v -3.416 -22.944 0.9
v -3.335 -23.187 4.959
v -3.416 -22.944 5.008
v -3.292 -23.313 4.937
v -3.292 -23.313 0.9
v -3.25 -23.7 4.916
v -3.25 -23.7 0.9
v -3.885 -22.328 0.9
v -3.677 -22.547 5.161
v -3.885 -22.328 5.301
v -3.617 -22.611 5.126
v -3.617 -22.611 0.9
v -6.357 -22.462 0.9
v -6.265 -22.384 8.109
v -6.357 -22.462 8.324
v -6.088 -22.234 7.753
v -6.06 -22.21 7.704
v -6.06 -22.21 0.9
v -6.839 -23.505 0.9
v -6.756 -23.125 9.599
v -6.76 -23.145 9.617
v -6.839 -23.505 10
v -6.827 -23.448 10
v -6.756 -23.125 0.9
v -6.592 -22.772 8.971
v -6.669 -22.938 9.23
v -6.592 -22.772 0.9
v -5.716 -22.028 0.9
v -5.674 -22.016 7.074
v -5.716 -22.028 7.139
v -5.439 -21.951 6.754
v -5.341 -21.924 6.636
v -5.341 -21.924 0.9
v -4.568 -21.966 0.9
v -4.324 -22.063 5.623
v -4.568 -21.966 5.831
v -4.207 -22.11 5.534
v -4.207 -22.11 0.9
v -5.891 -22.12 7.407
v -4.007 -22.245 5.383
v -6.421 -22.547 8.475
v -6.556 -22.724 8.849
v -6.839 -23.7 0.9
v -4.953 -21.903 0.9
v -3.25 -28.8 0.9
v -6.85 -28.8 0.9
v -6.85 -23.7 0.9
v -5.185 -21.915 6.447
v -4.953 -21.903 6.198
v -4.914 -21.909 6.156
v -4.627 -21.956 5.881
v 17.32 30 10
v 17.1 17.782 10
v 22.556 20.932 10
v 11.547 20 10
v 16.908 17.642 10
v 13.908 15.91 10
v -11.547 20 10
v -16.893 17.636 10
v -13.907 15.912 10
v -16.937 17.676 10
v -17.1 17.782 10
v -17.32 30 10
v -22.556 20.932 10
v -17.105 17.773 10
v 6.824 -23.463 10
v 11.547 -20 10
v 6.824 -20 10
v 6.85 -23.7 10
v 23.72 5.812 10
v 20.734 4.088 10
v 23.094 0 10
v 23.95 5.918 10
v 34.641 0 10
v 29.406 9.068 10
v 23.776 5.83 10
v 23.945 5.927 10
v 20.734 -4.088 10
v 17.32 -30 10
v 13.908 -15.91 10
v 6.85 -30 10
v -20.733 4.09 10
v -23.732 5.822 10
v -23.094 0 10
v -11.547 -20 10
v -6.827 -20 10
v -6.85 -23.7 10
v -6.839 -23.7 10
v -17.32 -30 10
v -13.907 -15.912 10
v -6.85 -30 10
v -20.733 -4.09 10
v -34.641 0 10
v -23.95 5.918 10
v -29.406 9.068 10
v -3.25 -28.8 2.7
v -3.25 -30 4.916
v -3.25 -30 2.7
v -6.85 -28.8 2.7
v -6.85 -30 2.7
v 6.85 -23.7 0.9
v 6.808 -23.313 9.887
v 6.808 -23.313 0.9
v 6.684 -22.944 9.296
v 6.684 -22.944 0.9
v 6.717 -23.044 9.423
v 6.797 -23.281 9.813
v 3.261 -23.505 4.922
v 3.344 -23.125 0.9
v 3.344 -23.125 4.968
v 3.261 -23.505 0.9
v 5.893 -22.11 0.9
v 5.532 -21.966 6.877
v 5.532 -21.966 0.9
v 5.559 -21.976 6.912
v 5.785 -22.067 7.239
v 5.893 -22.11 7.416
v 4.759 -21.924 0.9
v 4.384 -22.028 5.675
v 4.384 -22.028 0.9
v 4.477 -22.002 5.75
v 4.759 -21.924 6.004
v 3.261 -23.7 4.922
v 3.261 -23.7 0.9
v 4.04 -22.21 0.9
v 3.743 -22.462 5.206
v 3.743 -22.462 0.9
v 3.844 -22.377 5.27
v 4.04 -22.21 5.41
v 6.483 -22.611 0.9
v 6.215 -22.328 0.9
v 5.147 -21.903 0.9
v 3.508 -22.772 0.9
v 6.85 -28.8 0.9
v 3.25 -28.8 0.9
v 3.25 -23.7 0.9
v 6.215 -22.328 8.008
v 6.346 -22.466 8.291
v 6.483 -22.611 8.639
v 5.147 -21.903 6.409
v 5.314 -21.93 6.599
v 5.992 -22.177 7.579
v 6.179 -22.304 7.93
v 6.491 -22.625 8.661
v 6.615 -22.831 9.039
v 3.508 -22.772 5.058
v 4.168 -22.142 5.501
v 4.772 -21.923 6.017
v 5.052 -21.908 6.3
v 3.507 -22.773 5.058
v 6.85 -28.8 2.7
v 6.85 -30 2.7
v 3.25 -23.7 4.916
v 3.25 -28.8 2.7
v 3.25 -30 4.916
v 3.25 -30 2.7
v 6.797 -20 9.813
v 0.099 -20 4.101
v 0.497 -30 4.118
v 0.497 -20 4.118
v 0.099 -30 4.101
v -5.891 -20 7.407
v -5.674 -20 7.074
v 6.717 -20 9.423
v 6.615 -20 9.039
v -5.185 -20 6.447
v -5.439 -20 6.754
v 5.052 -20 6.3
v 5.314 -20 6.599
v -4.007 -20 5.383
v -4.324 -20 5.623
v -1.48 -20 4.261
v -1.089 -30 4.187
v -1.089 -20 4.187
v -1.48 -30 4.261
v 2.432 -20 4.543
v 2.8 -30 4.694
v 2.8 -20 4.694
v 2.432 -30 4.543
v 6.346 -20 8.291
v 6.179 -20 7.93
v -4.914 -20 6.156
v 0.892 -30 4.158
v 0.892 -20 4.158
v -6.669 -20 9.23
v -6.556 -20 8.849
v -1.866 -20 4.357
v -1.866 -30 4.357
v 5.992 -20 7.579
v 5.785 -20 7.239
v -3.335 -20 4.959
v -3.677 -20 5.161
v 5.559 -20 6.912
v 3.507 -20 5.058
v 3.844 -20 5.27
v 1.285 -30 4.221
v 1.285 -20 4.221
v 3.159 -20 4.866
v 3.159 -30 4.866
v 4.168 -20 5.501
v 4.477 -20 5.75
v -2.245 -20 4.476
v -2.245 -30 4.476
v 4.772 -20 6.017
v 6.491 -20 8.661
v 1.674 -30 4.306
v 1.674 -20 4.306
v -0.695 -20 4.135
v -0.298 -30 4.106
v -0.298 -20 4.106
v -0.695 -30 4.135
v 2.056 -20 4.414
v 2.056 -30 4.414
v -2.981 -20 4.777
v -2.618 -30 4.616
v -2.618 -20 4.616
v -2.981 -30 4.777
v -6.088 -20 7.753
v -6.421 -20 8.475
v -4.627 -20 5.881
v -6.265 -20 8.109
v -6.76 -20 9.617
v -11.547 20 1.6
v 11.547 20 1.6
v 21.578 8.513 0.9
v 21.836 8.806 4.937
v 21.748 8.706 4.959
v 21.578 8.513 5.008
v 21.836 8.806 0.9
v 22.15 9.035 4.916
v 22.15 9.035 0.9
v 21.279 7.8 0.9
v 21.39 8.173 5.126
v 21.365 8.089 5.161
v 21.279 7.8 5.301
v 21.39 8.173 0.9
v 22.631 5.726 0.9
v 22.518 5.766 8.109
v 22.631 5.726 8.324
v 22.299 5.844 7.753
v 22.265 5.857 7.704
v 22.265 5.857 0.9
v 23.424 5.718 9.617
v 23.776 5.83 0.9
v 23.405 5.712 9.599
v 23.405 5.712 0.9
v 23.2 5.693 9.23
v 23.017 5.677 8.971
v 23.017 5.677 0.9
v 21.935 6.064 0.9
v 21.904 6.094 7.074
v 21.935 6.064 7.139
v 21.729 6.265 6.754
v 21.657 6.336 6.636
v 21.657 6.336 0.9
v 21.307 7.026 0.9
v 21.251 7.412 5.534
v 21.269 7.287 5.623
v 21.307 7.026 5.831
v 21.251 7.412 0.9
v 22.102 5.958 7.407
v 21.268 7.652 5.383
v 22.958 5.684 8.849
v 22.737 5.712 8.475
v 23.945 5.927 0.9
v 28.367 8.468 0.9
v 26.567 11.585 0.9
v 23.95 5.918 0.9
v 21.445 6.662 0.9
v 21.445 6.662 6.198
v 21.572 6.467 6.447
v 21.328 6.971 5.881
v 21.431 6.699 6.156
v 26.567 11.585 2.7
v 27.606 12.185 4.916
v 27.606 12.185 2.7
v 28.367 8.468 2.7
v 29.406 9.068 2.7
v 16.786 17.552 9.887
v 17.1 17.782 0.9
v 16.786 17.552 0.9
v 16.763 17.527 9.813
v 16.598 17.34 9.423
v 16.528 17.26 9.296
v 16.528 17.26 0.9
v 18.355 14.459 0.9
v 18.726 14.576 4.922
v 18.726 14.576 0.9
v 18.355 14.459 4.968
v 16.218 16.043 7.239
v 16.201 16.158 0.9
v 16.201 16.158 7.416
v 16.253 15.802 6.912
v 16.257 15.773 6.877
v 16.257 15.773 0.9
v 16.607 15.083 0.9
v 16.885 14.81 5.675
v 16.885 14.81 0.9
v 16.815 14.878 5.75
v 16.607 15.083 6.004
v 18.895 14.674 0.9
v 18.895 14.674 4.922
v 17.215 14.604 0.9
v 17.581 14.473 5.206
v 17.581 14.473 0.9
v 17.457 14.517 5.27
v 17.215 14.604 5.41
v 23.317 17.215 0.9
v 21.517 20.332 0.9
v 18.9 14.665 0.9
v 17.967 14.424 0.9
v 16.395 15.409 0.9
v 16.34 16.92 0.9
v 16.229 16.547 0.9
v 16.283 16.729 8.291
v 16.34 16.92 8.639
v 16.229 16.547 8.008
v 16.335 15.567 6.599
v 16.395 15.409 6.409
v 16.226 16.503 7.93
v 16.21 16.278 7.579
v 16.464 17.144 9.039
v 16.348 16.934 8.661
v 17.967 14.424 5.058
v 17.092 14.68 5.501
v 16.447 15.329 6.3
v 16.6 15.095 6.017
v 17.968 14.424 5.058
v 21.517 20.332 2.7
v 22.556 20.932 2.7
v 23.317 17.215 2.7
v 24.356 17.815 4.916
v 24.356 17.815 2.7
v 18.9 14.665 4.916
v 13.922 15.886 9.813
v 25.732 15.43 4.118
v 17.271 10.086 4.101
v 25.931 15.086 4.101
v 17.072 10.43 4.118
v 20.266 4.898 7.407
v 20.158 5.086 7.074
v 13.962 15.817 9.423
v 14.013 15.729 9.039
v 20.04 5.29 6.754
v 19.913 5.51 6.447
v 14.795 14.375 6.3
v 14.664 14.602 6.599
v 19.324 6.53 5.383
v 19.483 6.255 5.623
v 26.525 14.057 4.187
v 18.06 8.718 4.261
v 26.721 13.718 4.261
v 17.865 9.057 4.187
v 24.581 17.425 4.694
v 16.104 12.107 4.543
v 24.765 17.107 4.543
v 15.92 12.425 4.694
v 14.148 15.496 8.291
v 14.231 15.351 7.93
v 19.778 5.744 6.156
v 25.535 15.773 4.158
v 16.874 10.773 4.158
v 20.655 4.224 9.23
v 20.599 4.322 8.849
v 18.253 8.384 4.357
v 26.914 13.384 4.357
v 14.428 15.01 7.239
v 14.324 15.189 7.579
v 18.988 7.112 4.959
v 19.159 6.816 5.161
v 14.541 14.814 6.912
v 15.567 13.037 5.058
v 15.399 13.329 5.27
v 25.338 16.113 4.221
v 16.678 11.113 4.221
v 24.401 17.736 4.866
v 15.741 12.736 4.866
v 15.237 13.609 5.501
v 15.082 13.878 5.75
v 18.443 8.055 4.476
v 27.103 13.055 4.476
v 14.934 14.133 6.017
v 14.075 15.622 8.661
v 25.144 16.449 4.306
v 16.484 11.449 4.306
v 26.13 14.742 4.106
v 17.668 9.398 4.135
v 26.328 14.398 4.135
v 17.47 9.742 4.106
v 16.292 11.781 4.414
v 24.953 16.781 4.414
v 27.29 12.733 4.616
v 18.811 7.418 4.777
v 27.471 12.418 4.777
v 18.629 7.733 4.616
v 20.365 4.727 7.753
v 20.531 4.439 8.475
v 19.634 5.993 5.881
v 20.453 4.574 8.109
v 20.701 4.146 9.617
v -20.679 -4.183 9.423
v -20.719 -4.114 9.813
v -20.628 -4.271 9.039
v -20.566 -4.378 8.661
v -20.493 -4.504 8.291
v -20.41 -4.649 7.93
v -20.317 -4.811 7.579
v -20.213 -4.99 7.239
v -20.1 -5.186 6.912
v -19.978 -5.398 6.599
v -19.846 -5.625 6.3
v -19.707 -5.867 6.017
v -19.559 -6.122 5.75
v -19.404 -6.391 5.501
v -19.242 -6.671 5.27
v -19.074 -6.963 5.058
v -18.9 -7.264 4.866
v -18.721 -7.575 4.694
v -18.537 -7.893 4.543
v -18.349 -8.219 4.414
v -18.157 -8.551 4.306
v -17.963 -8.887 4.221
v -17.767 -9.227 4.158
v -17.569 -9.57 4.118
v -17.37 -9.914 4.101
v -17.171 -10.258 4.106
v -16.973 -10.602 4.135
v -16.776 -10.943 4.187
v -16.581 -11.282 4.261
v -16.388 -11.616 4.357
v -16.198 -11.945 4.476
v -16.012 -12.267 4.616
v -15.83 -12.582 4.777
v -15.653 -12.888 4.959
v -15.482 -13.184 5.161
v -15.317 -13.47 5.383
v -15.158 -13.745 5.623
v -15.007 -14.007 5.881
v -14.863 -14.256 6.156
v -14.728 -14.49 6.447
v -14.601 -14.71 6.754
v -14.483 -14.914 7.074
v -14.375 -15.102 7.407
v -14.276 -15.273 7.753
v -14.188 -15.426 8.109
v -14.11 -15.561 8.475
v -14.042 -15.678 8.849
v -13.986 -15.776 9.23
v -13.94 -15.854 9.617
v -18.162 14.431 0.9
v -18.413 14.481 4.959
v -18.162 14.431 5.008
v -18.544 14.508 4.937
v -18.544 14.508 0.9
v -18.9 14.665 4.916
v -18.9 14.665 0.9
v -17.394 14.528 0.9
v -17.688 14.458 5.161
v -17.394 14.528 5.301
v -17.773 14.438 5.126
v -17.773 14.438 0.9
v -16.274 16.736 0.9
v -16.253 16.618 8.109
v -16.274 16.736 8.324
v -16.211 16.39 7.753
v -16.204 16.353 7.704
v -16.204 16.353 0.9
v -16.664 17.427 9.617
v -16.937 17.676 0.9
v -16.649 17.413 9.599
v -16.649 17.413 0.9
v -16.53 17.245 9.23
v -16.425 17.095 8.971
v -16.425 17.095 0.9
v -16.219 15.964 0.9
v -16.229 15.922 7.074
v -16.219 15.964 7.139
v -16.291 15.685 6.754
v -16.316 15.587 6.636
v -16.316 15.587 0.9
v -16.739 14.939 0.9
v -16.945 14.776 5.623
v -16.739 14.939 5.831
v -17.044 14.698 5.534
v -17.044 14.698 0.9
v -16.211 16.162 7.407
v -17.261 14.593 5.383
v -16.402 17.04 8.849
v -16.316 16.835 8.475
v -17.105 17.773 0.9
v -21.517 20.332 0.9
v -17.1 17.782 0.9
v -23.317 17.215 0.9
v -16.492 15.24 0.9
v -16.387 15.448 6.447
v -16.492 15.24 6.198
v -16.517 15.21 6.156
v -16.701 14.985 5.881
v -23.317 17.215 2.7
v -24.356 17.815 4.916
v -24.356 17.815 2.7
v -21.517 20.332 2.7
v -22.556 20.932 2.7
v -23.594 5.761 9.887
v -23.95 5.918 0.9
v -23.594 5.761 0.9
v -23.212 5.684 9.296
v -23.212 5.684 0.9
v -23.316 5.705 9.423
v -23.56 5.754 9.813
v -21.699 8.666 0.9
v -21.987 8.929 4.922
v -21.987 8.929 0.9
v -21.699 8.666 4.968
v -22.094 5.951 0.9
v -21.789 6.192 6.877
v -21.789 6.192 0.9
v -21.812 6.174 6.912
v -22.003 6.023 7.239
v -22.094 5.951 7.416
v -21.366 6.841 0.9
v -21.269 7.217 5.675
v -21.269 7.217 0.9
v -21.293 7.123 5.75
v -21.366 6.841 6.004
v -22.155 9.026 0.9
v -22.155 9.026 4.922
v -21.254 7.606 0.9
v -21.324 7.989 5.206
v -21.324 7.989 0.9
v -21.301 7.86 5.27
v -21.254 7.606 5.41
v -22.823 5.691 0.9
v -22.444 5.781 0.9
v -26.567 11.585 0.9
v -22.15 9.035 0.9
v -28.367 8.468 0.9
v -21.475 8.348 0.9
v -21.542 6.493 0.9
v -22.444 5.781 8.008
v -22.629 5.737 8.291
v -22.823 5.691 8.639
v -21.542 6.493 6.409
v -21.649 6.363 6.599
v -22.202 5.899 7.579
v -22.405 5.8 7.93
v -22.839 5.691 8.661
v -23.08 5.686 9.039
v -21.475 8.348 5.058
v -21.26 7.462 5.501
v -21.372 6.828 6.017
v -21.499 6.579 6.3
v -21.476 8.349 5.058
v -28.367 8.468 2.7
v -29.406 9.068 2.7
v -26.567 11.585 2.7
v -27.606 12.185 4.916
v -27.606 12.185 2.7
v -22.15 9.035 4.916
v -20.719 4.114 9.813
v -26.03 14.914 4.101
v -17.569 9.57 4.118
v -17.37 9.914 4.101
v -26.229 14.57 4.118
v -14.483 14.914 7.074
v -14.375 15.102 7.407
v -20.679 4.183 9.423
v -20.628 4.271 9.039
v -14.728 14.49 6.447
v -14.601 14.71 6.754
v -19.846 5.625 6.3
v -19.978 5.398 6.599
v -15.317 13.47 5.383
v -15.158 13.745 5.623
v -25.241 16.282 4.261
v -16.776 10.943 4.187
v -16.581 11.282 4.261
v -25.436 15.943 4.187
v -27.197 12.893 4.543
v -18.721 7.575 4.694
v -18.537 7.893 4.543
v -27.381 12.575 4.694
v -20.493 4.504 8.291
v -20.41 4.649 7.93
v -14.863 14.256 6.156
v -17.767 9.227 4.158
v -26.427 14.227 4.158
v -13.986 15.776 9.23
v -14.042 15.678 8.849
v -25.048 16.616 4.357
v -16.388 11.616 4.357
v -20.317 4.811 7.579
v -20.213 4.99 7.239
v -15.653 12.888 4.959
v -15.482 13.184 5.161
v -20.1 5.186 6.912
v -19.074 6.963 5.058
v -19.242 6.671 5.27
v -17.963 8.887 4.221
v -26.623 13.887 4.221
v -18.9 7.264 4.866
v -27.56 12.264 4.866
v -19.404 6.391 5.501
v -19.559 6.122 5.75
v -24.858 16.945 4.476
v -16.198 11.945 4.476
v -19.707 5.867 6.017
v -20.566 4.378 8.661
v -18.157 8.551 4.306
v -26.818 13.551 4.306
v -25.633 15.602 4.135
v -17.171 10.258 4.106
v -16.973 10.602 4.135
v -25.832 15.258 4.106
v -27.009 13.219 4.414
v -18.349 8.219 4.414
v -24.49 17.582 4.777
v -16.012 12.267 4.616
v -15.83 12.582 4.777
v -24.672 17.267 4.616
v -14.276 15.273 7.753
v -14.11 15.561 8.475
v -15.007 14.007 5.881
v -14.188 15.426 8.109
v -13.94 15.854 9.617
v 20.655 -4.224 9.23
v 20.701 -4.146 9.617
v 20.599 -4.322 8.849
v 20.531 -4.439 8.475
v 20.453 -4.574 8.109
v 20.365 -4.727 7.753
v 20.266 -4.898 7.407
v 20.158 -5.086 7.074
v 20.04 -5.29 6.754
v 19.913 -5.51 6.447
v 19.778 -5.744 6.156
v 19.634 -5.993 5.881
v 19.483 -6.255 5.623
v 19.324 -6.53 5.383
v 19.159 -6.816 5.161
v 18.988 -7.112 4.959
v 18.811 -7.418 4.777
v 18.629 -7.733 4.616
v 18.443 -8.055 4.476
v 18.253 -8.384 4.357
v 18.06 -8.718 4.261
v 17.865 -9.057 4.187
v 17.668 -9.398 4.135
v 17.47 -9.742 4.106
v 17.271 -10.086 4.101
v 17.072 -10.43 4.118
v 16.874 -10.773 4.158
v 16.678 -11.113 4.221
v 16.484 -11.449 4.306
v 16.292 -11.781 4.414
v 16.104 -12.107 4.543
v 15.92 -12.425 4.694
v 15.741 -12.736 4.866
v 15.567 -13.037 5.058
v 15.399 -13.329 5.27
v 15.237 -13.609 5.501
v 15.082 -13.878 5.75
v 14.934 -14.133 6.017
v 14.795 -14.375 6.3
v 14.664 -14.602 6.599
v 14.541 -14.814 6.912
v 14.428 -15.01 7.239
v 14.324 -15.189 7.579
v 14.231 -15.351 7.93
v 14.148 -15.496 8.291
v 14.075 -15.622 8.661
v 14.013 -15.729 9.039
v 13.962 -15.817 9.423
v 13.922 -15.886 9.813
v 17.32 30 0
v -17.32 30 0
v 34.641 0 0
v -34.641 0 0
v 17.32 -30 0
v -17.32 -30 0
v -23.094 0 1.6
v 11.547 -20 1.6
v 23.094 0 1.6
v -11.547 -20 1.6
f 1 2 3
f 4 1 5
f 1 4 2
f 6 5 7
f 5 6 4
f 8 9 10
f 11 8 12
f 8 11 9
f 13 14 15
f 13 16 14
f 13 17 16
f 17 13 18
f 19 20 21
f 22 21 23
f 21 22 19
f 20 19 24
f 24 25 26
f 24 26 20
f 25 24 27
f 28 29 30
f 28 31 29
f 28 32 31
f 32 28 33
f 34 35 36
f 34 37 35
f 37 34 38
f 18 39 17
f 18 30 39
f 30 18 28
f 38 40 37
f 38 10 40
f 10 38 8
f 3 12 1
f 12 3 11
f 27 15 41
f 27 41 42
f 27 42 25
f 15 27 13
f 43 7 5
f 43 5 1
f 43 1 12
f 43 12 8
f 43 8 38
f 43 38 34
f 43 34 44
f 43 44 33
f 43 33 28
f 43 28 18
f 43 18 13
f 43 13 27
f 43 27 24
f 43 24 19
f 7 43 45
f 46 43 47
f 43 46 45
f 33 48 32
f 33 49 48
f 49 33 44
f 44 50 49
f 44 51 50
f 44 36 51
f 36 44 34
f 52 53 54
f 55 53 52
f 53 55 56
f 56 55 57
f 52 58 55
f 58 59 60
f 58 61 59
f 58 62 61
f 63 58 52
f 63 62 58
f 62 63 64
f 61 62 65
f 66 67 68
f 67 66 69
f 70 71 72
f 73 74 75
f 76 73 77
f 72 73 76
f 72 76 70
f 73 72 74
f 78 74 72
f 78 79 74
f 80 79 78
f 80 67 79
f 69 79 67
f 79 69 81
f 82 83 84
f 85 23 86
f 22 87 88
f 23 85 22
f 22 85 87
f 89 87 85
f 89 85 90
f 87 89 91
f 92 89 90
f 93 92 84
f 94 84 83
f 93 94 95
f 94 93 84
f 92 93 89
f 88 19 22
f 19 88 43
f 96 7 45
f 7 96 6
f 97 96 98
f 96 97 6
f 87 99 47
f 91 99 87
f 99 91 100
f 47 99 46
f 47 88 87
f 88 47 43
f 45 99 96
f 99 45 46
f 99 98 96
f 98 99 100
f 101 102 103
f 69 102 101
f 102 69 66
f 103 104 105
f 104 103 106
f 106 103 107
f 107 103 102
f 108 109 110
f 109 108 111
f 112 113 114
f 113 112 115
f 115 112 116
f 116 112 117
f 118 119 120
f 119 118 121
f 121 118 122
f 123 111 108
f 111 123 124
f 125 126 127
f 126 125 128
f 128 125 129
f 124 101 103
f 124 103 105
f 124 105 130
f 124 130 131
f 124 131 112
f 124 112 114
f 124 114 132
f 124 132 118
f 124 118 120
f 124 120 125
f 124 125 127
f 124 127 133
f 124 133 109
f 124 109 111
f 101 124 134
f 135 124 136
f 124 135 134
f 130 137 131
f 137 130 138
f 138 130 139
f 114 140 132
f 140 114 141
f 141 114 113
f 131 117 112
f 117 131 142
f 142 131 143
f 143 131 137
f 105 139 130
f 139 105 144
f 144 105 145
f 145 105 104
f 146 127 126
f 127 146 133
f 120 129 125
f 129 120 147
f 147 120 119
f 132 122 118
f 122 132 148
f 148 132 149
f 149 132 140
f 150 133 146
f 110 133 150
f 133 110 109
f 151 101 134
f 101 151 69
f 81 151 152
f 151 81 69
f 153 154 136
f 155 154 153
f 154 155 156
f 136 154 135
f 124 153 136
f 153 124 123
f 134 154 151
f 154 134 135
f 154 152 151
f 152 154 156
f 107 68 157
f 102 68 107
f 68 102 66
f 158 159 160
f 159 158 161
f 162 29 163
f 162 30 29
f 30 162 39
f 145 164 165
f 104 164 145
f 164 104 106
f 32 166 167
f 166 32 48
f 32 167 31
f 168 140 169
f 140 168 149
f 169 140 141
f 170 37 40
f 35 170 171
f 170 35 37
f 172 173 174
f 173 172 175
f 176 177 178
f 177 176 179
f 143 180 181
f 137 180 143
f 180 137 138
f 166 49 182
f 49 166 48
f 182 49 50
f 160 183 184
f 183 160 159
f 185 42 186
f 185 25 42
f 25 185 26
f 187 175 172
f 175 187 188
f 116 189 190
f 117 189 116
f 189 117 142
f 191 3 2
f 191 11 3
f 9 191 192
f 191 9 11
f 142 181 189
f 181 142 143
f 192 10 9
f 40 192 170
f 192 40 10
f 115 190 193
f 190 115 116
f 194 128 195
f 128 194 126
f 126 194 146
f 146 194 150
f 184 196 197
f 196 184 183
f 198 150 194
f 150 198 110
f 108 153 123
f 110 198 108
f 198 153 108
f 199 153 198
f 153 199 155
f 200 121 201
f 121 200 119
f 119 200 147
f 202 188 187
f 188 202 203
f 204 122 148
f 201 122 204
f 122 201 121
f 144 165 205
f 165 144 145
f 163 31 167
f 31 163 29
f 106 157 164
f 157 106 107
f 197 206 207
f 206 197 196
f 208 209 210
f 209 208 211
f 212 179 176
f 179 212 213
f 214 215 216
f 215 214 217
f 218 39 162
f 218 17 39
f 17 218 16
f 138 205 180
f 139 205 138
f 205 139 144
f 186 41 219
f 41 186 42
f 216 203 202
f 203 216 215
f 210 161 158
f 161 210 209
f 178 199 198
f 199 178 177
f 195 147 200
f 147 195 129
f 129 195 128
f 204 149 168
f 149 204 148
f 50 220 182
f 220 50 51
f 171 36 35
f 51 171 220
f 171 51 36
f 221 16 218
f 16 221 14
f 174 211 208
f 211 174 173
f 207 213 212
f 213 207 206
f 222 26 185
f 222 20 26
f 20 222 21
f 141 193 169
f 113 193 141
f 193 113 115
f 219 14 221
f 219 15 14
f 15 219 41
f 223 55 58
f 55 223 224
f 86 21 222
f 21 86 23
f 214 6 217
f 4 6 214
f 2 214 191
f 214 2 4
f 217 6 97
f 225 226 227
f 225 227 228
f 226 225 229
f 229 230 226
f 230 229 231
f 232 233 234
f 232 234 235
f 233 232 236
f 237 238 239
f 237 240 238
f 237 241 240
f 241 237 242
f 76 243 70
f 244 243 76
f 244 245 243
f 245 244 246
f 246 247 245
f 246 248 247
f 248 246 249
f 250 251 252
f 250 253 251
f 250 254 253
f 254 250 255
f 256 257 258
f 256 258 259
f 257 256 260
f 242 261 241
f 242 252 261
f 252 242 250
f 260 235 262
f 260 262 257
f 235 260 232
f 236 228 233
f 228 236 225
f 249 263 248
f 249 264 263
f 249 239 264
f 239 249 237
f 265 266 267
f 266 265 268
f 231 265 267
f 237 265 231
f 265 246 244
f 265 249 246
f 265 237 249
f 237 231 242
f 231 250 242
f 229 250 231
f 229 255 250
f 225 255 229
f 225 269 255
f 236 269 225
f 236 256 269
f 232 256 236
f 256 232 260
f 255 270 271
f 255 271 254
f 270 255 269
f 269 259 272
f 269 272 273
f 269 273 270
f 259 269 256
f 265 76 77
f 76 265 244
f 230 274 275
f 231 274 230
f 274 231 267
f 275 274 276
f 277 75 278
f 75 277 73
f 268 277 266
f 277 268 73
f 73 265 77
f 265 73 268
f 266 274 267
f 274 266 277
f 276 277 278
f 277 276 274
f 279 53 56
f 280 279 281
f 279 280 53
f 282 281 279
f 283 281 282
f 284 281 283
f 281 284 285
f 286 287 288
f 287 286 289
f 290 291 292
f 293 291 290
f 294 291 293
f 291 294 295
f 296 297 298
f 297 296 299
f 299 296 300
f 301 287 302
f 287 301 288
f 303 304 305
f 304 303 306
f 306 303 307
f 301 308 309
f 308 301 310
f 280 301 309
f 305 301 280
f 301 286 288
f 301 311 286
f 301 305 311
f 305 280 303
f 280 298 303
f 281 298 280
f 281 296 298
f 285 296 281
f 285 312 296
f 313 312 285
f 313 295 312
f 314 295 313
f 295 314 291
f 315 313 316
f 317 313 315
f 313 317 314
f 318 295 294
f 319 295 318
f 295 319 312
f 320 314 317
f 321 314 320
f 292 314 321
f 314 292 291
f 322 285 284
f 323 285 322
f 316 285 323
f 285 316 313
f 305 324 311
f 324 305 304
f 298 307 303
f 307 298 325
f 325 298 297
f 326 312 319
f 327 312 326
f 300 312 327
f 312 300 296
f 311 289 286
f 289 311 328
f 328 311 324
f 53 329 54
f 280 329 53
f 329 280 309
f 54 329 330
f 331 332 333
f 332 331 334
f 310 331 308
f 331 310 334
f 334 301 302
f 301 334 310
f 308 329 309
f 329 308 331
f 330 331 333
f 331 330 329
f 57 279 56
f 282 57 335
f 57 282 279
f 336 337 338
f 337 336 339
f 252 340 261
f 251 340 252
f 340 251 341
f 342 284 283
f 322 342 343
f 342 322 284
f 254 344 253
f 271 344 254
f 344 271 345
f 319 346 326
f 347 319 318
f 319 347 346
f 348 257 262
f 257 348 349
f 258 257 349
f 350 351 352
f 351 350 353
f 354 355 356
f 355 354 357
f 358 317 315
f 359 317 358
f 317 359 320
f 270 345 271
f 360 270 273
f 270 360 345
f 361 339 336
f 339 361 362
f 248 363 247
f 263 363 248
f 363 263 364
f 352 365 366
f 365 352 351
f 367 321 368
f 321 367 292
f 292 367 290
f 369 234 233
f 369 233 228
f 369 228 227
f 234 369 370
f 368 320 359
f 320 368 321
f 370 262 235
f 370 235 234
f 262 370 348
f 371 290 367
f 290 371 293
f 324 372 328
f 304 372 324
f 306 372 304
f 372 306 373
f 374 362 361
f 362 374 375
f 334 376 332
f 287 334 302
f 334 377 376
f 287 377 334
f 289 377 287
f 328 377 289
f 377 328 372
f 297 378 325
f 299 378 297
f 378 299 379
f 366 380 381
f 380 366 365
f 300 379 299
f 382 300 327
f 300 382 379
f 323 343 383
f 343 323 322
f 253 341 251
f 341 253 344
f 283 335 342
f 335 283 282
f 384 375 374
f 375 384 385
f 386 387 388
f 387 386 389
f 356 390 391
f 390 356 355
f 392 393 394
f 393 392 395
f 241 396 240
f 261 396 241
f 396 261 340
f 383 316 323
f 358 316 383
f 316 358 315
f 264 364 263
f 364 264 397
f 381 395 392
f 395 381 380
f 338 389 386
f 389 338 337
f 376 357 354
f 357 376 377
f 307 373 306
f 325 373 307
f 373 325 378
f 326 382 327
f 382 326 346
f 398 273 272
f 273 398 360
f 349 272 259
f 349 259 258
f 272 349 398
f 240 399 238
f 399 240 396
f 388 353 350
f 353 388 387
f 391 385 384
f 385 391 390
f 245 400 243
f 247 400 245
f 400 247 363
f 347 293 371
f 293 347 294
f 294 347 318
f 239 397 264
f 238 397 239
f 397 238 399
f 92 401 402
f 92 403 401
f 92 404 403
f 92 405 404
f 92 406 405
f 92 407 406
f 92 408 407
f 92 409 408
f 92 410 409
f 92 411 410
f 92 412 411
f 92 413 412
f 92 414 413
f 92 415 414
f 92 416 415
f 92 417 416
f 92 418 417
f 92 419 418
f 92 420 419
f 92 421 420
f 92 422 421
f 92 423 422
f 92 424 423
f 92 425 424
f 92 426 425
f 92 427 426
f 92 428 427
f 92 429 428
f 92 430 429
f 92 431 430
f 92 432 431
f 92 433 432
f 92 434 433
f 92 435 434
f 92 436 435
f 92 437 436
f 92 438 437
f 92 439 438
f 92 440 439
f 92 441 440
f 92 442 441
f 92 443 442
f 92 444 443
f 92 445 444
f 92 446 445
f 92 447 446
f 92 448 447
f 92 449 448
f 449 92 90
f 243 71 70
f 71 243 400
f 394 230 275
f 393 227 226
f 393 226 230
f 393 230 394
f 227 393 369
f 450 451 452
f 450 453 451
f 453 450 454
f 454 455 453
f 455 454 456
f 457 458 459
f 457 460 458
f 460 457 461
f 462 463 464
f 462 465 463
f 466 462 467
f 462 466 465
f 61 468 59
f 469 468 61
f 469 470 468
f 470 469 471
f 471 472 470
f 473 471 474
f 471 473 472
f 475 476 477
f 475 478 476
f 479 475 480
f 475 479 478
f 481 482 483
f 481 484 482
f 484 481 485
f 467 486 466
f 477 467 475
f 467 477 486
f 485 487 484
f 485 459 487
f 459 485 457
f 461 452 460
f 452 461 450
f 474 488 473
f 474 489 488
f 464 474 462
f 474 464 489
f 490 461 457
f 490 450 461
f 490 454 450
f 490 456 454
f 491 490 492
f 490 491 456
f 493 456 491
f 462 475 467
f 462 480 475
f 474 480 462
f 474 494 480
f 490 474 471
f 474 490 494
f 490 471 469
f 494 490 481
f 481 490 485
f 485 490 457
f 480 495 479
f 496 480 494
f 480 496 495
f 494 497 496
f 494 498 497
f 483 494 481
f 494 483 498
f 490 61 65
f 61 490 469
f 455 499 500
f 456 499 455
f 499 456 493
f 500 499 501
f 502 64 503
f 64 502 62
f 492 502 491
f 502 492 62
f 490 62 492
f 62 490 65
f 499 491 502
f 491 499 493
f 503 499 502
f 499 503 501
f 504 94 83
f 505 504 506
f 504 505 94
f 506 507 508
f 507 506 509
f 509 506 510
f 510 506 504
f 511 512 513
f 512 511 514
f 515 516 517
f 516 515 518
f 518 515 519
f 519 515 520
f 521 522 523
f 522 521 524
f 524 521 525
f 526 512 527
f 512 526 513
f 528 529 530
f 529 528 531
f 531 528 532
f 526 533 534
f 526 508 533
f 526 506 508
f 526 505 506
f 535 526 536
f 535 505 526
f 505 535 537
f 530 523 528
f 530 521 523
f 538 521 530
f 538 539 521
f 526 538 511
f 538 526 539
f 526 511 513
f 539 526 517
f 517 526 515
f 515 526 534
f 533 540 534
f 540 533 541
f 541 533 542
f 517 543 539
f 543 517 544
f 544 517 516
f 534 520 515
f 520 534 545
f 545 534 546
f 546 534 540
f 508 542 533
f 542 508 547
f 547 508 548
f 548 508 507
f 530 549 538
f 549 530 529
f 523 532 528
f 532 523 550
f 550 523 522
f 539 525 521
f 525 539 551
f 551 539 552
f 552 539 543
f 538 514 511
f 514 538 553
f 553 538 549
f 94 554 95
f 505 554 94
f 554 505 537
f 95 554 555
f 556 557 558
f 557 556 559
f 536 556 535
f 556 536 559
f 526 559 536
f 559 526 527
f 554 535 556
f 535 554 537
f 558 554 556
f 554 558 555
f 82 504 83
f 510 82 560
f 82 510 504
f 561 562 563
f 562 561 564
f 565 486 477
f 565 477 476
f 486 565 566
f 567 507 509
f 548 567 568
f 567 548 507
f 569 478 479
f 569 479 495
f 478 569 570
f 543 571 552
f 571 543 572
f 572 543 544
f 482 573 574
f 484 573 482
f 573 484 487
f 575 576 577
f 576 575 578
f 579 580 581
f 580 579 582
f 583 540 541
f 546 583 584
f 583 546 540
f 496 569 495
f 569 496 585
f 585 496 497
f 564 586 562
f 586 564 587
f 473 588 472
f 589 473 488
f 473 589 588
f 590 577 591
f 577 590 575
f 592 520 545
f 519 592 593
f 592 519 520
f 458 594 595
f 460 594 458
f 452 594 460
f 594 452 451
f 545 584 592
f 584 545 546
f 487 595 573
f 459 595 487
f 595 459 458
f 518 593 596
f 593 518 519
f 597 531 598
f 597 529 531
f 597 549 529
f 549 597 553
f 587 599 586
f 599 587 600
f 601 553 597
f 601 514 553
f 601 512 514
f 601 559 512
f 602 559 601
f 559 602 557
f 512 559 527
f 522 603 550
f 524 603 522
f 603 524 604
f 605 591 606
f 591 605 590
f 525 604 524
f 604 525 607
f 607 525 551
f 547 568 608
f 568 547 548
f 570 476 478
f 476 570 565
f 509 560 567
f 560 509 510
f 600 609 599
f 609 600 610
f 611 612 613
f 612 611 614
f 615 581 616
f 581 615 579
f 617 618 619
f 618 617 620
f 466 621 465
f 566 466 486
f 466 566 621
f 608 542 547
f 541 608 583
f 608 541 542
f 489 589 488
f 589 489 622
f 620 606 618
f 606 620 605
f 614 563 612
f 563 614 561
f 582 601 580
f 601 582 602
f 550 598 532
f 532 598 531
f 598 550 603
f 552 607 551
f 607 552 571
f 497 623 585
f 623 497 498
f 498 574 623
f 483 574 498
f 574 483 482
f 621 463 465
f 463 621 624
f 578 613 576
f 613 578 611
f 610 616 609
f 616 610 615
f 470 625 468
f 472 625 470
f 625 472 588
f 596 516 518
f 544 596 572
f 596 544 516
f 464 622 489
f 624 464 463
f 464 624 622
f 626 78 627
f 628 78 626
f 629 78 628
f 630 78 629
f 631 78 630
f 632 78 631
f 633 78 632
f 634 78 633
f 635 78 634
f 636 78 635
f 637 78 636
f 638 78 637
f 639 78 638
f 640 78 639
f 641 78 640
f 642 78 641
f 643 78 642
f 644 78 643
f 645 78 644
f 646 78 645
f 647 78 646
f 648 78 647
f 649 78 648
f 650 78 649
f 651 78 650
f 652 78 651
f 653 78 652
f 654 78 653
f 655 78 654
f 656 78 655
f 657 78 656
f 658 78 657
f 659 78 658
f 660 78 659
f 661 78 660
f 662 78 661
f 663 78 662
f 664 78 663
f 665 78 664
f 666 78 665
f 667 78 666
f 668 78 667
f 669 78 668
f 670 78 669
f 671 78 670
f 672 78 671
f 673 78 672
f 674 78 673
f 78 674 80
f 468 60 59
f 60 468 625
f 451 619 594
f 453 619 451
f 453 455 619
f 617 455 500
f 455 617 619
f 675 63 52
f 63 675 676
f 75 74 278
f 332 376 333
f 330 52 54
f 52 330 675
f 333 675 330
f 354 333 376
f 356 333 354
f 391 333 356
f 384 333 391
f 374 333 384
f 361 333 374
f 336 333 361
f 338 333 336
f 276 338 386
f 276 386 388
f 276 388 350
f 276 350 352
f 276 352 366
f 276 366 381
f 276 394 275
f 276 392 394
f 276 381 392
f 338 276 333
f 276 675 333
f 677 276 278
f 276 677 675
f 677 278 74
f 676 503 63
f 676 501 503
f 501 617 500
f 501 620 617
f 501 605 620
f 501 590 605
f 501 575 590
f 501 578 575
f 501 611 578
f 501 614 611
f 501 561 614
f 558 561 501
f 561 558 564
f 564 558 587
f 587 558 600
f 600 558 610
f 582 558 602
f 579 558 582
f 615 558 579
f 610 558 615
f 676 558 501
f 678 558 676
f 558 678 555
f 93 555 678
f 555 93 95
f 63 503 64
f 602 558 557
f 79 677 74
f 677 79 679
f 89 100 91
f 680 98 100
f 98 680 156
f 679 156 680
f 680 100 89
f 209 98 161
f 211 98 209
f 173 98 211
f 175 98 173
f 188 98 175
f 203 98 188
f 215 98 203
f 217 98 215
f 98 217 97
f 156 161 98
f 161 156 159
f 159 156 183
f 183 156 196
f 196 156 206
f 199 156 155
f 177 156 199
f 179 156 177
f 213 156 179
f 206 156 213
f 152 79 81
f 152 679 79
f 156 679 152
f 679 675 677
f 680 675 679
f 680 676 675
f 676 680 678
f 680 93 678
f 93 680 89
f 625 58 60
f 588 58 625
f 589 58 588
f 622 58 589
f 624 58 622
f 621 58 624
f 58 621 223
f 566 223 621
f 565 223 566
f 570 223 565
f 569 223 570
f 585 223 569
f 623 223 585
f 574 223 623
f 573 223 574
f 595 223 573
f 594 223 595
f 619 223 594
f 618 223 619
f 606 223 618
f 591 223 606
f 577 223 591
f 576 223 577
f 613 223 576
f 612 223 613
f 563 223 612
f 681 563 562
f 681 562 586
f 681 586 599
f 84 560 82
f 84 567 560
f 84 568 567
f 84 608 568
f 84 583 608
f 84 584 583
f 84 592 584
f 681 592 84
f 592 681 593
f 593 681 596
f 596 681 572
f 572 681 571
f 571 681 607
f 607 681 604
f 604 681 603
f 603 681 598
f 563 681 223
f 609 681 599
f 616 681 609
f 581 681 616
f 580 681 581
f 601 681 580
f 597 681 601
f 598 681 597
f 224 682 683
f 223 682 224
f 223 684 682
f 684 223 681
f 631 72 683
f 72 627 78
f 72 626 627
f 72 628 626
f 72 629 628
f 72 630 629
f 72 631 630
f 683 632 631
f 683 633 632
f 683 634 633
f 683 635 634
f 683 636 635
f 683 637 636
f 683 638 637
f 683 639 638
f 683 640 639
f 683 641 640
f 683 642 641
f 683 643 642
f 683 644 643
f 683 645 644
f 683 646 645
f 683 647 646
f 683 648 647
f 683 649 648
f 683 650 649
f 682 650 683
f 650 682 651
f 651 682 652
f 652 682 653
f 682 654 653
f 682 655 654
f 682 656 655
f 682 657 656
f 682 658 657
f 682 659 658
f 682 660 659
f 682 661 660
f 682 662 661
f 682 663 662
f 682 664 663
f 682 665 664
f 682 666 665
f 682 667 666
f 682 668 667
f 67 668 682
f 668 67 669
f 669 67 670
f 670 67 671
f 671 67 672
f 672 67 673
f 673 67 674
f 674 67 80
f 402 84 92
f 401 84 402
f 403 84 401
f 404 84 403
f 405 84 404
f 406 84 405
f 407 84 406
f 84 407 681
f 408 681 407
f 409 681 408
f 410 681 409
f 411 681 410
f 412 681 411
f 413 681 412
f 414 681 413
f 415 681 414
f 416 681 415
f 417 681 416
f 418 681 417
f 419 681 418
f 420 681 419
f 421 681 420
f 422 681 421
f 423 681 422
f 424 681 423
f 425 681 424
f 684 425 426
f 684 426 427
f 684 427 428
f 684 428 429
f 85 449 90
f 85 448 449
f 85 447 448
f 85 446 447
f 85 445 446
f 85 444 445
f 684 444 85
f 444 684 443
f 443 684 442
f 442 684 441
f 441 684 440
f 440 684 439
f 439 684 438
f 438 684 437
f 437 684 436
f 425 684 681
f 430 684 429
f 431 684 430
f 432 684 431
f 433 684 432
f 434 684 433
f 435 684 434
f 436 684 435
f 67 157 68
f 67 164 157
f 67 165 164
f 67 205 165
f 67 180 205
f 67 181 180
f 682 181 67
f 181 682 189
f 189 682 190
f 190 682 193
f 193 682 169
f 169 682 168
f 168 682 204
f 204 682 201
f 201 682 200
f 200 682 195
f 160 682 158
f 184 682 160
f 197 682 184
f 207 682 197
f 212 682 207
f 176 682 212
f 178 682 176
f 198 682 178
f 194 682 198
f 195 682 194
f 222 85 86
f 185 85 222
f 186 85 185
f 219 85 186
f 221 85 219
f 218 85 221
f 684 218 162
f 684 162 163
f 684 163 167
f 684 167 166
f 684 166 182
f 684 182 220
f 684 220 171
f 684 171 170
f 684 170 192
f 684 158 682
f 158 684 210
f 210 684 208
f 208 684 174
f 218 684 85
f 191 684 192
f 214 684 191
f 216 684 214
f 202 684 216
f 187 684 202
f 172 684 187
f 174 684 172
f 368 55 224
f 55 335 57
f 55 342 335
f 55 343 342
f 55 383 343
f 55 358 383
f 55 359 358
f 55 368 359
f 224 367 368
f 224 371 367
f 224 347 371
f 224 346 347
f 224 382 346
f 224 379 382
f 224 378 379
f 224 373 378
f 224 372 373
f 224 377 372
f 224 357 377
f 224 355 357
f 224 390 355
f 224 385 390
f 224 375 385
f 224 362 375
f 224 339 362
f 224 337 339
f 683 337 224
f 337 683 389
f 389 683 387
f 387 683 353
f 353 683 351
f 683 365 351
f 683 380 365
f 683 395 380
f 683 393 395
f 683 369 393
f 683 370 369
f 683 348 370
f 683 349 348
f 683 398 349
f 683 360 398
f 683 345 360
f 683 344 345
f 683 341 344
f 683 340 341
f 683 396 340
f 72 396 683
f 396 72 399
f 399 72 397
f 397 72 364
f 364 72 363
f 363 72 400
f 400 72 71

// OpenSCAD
// file: hexagon.scad
module hexagon (h = 10, s = 59.7)
{
  r = s / 2 / cos (30);
  linear_extrude (height = h)
    polygon ([for (phi = [0:60:360]) [r*cos(phi), r*sin(phi)]]);
}
// file: rail_stamp.scad
module rail_stamp(rinne_offset = 0.01)
{
// Design so, dass 0,0,0 die Mitte der Rinne,
// Außenkante Sechseck, Oberfläche ist.
// Mit rinne_offset kann der Zylinder für die Rinne
// über das Minimum hinaus verlängert werden

noff = 1;  // auch ein Offset, allerdings wird der nach hinten freigeschnitten (für moderate Neigungen)

// Fix, bzw. durch die Geometrie des Spiels vorgegeben
D_Kugel   = 12.8; // mm
D_Rinne   = 13.8; // mm
h_Rinne   = 5.9;  // Rinnentiefe in mm

// Die zwei Ausbuchtungen recht und links
D_bogen  = 3.6;   // Oberer Bogen
s_rand   = 1.2;   // Abstand zur Außenkante
h_tasche = 5.1;   // Höhe der Tasche
t_tasche = 9.1;   // Tiefe der Tasche zur Oberfläche
t_rand   = 7.3;   // Tiefe des Absatzes (der s_rand breite Steg) 
x_tasche = 6.5/2; // Abstand Tasche linke Seite zur Symmetrielinie

//mirror ([1, 0, 0])
for (k = [-1:2:1])
{
  translate([k* (x_tasche + D_bogen/2), h_tasche + s_rand, -t_tasche])
    cylinder (t_tasche, d = D_bogen);

  cube_x = k * x_tasche - ((k < 0)? D_bogen : 0);
  translate([cube_x, s_rand, -t_tasche])
    cube([D_bogen, h_tasche, t_tasche]);

  translate([cube_x, +0.01 - noff, -t_rand])
    cube ([D_bogen, s_rand + noff, t_rand]);
}
translate ([0, -noff, D_Rinne/2 - h_Rinne]) // Oberfläche bei z = 0
  rotate ([-90, 0, 0])
    cylinder (h = 10 + rinne_offset + noff, d = D_Rinne);
}
// main file
use <rail_stamp.scad>
use <hexagon.scad>

$fa = 1;
$fs = 0.4;

h_Hexagon_aussen = 60;

difference ()
{
  hexagon (h = 10, s = h_Hexagon_aussen);

translate ([0, 0, 1.6])
  hexagon (h = 10, s = 40); // grob innen

for (k = [0:2])
  rotate ([0, 0, 120 * k])
    translate ([0, -30, 10])
      rail_stamp (rinne_offset = 40);
}
